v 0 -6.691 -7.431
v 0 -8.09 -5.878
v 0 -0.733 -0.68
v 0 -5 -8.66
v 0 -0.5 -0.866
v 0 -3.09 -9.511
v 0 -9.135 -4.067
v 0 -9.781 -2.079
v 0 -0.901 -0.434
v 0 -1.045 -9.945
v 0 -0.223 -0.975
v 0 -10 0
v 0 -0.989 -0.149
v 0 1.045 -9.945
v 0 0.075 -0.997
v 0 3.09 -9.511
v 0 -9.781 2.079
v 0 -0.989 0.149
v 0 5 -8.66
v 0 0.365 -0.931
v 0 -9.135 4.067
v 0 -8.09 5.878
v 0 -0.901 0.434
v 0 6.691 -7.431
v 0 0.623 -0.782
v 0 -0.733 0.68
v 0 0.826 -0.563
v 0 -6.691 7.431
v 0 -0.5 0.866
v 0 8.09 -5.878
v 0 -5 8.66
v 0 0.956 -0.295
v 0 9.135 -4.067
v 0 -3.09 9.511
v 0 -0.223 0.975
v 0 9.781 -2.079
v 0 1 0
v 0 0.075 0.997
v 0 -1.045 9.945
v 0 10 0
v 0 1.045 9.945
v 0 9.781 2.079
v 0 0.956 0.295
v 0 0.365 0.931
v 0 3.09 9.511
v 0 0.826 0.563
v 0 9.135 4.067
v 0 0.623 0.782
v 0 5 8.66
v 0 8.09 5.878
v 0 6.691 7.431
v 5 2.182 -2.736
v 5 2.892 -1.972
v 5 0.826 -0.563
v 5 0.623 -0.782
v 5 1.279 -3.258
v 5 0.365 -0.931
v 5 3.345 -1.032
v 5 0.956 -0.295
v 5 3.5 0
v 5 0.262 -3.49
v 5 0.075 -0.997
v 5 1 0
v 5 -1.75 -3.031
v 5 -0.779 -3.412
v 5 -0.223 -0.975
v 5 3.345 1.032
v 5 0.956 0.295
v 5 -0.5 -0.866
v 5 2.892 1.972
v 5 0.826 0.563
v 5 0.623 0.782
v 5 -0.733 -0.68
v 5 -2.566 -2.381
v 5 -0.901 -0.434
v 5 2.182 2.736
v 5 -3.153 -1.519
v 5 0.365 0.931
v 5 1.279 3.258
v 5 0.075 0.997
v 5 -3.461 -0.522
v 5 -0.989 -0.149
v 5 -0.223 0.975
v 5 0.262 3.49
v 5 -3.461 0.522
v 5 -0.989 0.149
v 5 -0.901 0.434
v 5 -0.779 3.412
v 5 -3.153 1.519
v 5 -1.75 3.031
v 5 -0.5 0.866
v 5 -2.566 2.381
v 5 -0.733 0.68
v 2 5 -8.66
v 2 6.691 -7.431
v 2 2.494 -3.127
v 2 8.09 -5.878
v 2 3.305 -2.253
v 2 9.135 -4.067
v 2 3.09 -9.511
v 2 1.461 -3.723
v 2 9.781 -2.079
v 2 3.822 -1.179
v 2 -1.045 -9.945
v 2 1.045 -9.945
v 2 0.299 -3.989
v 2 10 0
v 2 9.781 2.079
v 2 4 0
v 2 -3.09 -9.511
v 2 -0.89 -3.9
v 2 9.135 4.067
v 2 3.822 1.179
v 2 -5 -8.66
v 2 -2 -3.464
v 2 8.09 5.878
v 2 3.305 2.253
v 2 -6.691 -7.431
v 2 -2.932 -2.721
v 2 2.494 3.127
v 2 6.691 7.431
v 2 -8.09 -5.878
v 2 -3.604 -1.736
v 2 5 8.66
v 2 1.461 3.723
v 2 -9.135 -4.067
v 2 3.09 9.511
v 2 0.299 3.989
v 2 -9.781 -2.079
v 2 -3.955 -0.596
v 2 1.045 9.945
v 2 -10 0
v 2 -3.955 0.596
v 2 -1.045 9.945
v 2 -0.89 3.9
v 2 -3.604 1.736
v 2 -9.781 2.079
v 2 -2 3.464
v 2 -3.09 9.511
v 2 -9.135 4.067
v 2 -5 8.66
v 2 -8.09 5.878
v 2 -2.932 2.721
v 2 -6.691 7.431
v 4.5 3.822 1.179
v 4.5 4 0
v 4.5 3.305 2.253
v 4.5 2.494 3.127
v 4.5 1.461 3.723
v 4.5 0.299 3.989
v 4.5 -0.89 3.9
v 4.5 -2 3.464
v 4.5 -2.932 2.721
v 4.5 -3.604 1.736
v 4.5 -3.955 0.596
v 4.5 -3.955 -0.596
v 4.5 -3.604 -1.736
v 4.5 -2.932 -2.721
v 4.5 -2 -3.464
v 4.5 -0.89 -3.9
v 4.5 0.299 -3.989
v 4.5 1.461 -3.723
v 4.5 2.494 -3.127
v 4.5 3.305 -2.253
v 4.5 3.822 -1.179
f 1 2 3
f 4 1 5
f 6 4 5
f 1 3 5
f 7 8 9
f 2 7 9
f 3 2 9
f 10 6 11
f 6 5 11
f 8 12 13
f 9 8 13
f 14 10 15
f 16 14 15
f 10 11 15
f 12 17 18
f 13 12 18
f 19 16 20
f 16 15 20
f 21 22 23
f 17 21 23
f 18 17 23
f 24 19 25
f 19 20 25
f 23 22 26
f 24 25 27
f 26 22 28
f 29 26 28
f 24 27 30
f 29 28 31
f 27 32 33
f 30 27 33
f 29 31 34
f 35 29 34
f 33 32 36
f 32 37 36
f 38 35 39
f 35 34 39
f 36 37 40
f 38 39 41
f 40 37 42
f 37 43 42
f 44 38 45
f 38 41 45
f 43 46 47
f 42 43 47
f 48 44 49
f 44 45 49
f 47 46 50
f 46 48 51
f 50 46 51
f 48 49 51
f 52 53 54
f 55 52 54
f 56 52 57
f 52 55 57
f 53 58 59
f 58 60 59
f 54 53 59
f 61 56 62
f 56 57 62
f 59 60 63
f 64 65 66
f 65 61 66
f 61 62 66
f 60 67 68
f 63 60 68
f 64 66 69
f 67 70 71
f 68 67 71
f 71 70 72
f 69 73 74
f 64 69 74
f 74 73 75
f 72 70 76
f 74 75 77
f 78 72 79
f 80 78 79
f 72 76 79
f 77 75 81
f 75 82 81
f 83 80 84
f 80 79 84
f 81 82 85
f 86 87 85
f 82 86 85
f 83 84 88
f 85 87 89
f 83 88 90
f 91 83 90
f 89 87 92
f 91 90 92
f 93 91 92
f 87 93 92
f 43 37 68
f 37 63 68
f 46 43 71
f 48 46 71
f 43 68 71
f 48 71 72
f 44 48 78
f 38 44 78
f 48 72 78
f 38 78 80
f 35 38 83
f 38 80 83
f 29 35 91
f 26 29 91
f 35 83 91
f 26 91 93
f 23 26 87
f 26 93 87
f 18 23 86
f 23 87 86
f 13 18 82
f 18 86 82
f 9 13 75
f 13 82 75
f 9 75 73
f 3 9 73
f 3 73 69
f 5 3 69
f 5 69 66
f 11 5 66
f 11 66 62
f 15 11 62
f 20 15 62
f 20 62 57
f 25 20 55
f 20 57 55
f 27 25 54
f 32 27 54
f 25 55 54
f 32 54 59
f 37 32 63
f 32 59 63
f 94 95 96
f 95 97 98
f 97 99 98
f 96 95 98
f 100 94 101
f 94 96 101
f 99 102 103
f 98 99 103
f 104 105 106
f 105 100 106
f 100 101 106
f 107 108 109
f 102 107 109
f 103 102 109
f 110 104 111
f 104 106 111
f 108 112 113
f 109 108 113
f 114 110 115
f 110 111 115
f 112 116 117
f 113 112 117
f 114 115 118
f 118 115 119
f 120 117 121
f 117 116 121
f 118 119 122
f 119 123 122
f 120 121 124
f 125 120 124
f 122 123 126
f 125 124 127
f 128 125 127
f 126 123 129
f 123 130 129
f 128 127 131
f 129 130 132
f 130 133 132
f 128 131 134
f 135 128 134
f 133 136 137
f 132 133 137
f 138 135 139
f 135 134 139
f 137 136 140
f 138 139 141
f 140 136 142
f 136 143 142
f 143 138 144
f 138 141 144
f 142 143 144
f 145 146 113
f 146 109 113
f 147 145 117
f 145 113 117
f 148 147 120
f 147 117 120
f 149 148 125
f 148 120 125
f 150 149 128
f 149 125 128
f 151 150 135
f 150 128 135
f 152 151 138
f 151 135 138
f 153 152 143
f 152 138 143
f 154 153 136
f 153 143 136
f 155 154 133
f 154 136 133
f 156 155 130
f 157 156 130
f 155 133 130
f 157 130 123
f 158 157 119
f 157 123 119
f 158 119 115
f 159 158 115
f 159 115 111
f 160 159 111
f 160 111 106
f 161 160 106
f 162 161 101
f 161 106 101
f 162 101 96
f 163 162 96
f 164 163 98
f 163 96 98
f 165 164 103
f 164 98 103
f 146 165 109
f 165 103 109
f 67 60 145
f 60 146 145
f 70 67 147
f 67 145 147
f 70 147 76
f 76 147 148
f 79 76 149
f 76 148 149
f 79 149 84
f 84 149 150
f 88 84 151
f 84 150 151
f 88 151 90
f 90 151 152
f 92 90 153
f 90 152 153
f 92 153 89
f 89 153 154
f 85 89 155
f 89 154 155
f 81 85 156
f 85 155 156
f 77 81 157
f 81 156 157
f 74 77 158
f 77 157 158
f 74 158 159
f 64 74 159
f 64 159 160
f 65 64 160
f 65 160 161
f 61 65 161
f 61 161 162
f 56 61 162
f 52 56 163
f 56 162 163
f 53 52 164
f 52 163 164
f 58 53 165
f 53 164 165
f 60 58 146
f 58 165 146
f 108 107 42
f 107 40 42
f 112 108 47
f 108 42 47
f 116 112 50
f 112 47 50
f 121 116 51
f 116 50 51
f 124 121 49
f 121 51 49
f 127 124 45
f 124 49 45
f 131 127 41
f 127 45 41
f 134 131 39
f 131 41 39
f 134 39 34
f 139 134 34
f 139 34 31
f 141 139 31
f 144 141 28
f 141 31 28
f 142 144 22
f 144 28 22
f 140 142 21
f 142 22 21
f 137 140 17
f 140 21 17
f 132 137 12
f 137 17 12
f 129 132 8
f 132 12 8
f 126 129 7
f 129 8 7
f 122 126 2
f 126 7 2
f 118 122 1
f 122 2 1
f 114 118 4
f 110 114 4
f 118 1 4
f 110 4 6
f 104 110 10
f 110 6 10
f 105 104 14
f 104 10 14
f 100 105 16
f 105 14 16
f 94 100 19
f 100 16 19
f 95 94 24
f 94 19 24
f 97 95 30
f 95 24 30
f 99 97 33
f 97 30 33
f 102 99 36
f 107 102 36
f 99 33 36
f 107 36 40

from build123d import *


with BuildPart() as f1:
    # F0 (on Top) → F1 (revolve)
    with BuildSketch(Plane.XY):
        Polygon((0, 10), (0, 1), (2, 1), (2, 4), (2, 10), align=None)
        Polygon((2, 4), (2, 1), (5, 1), (5, 3.5), (4.5, 4), align=None)
    revolve(axis=Axis((5.453455, 0, 0), (1, 0, 0)))


solid = f1.part
